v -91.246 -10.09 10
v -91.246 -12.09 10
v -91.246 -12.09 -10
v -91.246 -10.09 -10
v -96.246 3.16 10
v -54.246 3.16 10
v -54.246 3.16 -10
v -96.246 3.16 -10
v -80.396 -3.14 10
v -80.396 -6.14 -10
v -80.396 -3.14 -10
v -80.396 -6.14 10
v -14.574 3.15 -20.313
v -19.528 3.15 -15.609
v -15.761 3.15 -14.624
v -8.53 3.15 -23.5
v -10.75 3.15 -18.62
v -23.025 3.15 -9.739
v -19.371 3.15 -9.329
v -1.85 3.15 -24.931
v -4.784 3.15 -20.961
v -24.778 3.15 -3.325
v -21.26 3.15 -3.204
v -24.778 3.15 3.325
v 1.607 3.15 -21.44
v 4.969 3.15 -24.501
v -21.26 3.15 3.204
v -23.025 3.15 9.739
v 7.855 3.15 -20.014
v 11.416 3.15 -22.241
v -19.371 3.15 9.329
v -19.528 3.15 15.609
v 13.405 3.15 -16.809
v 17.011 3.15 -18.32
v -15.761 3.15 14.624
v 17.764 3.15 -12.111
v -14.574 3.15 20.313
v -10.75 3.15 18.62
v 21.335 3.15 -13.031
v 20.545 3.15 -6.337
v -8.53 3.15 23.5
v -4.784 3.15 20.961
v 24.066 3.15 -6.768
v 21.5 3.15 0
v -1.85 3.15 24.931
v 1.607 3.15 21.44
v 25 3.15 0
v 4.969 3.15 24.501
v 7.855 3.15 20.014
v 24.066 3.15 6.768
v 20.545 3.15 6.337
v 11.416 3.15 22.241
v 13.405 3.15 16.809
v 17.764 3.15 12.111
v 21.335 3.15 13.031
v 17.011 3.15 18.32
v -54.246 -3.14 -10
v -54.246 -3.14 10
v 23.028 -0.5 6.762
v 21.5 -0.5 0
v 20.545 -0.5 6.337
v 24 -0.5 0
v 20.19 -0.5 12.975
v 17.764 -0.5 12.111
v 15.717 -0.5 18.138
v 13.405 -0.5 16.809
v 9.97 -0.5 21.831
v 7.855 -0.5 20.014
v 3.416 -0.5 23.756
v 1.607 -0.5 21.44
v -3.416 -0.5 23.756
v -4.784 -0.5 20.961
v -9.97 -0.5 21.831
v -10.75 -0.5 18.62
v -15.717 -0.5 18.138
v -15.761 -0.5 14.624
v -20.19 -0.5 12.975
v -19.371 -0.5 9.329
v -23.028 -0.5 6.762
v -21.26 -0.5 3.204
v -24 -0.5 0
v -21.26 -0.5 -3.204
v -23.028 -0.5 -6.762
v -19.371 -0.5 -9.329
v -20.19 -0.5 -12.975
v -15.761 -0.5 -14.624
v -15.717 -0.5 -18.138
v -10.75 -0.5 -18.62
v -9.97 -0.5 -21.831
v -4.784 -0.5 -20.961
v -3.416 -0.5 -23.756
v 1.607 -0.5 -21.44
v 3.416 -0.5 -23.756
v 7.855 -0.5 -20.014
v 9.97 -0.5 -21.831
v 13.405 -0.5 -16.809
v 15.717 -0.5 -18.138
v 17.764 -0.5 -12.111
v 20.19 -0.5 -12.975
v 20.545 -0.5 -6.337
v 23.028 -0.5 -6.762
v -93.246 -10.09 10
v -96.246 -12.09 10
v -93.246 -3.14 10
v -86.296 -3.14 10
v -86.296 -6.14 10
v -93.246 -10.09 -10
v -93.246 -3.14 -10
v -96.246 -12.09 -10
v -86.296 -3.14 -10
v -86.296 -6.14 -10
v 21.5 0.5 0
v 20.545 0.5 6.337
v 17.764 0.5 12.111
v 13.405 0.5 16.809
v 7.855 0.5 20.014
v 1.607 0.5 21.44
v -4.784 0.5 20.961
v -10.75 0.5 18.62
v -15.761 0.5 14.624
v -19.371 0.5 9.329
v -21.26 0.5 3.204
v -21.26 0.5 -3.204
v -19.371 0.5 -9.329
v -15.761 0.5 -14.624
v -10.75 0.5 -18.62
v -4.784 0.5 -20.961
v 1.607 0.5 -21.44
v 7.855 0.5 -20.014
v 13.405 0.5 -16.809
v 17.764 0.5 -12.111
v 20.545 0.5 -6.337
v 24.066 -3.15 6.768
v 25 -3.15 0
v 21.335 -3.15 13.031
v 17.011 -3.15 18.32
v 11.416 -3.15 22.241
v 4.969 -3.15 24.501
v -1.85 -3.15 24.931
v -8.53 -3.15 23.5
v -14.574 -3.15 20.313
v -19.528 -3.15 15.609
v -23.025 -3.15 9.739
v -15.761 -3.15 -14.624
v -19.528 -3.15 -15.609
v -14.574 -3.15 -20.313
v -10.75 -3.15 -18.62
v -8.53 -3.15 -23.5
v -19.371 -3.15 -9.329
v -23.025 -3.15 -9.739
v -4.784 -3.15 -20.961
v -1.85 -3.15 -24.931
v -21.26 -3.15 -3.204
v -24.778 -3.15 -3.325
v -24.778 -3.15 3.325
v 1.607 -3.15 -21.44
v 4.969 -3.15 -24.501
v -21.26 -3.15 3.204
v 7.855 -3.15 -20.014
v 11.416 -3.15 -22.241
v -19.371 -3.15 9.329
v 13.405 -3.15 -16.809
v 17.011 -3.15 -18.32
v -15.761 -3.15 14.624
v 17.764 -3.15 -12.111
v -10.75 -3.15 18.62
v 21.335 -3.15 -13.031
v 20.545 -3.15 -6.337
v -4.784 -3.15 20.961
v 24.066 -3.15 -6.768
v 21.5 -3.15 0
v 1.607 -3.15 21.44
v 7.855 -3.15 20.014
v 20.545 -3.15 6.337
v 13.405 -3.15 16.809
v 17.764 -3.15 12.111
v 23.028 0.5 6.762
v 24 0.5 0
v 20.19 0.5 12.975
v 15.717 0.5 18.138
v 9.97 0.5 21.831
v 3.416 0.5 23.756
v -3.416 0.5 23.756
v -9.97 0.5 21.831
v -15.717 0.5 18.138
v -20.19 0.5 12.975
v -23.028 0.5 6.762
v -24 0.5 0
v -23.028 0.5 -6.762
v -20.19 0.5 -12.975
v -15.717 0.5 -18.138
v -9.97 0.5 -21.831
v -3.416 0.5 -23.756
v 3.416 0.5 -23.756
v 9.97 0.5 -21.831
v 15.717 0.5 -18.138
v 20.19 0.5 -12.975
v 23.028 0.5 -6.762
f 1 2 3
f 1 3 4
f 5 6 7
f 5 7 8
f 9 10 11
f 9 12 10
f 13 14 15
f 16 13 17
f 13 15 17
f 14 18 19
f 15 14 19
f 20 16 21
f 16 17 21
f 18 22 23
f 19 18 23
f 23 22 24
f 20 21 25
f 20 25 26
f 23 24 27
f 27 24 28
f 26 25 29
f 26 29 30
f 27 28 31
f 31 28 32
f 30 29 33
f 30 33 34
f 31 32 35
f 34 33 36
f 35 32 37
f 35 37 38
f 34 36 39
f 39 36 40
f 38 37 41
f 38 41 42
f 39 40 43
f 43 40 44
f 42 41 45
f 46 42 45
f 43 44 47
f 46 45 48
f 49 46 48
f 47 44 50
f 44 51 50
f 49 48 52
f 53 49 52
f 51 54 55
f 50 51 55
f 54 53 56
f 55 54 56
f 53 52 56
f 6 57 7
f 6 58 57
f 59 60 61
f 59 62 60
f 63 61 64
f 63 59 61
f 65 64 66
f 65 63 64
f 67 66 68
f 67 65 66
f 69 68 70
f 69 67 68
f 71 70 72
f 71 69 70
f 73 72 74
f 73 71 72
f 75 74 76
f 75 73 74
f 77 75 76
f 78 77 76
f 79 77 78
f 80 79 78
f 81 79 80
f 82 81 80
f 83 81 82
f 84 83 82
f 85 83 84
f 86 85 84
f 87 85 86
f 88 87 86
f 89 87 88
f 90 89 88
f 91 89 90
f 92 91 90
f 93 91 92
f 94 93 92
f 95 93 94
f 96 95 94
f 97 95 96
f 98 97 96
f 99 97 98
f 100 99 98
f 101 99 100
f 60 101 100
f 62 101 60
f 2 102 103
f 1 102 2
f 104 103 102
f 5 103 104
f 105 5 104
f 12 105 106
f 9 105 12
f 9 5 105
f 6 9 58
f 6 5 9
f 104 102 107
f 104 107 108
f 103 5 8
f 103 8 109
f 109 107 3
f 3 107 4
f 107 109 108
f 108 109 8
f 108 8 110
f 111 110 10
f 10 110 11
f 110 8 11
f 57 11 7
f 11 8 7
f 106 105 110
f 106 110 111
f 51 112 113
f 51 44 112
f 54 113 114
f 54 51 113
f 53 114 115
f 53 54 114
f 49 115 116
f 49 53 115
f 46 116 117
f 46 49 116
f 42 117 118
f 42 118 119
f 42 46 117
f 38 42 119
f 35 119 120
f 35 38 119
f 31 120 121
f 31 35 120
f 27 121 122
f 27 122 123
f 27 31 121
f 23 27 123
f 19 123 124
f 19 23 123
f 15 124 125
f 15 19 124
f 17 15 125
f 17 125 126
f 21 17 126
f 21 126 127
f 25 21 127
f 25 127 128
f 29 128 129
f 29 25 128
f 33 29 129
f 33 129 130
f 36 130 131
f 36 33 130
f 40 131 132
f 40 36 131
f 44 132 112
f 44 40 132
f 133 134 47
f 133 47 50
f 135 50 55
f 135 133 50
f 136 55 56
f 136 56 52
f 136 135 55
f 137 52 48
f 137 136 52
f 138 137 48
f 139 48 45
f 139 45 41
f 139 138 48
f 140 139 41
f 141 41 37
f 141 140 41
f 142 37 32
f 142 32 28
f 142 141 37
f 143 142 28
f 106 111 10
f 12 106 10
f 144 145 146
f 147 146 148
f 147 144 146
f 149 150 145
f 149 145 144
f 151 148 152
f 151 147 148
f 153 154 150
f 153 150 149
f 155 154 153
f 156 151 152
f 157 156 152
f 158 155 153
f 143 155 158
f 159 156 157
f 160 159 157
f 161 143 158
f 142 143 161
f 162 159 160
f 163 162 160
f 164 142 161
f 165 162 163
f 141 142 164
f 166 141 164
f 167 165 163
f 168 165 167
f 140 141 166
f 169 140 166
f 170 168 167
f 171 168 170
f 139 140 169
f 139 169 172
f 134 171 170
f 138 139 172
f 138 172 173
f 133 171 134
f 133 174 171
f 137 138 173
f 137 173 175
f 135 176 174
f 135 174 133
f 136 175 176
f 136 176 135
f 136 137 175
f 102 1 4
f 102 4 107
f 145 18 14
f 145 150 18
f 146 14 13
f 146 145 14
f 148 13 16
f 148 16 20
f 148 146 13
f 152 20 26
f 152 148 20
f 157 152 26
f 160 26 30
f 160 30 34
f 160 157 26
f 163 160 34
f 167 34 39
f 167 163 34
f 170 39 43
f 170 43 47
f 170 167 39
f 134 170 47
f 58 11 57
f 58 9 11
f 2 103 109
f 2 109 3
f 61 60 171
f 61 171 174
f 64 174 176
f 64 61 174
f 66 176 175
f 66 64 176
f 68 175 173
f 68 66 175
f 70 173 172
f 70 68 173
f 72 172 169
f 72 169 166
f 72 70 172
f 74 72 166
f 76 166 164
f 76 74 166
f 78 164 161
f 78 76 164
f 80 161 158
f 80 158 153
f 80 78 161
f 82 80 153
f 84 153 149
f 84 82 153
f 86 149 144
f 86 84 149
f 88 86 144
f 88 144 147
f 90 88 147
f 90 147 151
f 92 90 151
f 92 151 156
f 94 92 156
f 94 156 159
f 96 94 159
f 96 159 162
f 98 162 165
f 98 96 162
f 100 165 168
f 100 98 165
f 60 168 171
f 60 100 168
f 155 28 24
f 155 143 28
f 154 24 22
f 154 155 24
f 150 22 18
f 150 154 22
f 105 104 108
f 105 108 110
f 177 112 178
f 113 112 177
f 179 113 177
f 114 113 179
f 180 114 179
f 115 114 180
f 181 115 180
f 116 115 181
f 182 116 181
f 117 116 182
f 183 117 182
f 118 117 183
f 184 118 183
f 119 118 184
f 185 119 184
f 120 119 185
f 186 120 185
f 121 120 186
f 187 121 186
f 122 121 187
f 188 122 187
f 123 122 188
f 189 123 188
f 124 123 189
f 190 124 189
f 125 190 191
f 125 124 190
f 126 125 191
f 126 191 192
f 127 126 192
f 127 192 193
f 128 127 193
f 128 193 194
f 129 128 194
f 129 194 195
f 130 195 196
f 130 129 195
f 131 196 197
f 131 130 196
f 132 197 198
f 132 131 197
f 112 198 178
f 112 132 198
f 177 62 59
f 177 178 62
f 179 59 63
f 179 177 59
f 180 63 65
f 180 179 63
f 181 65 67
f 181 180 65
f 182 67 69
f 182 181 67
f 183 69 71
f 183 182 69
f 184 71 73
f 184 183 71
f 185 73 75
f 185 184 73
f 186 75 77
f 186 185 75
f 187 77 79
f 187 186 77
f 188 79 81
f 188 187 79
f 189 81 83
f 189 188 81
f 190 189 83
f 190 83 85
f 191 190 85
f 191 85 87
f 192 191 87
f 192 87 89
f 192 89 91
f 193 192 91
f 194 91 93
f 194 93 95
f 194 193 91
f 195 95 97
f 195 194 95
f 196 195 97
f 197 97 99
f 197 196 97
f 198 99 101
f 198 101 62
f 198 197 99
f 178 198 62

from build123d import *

# Parameters (mm, degrees)
F0_R     = 21.5
F1_DEPTH = 3.15
F5_DEPTH = 10


with BuildPart() as f1:
    # F0 (on Front) → F1 (new body, symmetric)
    with BuildSketch(Plane.XZ):
        with BuildLine():
            ThreePointArc((-23.02491, -9.739276), (4.968765, -24.501253), (25, 0))
            ThreePointArc((25, 0), (4.968765, 24.501253), (-23.02491, 9.739276))
            ThreePointArc((-23.02491, 9.739276), (-25, 0), (-23.02491, -9.739276))
        make_face()
        Circle(F0_R, mode=Mode.SUBTRACT)
    extrude(amount=F1_DEPTH, both=True)

    # F3: sweep along a path in F0
    with BuildLine(Plane.XZ) as f3_path:
        CenterArc((0, 0), 21.5, 0, 360)
    # F2 (on Top) → F3 (sweep, cut)
    with BuildSketch(Plane.XY):
        Polygon((21.5, 0), (21.5, -0.5), (24, -0.5), (24, 0.5), (21.5, 0.5), align=None)
    sweep(path=f3_path.line, mode=Mode.SUBTRACT)


with BuildPart() as f5:
    # F4 (on Top) → F5 (new body, symmetric)
    with BuildSketch(Plane.XY):
        Polygon((-54.246395, -3.139862), (-54.246395, 3.160138), (-96.246395, 3.160138), (-96.246395, -12.089862), (-91.246395, -12.089862), (-91.246395, -10.089862), (-93.246395, -10.089862), (-93.246395, -3.139862), (-86.296395, -3.139862), (-86.296395, -6.139862), (-80.396395, -6.139862), (-80.396395, -3.139862), align=None)
    extrude(amount=F5_DEPTH, both=True)


solid = Compound([f1.part, f5.part])
